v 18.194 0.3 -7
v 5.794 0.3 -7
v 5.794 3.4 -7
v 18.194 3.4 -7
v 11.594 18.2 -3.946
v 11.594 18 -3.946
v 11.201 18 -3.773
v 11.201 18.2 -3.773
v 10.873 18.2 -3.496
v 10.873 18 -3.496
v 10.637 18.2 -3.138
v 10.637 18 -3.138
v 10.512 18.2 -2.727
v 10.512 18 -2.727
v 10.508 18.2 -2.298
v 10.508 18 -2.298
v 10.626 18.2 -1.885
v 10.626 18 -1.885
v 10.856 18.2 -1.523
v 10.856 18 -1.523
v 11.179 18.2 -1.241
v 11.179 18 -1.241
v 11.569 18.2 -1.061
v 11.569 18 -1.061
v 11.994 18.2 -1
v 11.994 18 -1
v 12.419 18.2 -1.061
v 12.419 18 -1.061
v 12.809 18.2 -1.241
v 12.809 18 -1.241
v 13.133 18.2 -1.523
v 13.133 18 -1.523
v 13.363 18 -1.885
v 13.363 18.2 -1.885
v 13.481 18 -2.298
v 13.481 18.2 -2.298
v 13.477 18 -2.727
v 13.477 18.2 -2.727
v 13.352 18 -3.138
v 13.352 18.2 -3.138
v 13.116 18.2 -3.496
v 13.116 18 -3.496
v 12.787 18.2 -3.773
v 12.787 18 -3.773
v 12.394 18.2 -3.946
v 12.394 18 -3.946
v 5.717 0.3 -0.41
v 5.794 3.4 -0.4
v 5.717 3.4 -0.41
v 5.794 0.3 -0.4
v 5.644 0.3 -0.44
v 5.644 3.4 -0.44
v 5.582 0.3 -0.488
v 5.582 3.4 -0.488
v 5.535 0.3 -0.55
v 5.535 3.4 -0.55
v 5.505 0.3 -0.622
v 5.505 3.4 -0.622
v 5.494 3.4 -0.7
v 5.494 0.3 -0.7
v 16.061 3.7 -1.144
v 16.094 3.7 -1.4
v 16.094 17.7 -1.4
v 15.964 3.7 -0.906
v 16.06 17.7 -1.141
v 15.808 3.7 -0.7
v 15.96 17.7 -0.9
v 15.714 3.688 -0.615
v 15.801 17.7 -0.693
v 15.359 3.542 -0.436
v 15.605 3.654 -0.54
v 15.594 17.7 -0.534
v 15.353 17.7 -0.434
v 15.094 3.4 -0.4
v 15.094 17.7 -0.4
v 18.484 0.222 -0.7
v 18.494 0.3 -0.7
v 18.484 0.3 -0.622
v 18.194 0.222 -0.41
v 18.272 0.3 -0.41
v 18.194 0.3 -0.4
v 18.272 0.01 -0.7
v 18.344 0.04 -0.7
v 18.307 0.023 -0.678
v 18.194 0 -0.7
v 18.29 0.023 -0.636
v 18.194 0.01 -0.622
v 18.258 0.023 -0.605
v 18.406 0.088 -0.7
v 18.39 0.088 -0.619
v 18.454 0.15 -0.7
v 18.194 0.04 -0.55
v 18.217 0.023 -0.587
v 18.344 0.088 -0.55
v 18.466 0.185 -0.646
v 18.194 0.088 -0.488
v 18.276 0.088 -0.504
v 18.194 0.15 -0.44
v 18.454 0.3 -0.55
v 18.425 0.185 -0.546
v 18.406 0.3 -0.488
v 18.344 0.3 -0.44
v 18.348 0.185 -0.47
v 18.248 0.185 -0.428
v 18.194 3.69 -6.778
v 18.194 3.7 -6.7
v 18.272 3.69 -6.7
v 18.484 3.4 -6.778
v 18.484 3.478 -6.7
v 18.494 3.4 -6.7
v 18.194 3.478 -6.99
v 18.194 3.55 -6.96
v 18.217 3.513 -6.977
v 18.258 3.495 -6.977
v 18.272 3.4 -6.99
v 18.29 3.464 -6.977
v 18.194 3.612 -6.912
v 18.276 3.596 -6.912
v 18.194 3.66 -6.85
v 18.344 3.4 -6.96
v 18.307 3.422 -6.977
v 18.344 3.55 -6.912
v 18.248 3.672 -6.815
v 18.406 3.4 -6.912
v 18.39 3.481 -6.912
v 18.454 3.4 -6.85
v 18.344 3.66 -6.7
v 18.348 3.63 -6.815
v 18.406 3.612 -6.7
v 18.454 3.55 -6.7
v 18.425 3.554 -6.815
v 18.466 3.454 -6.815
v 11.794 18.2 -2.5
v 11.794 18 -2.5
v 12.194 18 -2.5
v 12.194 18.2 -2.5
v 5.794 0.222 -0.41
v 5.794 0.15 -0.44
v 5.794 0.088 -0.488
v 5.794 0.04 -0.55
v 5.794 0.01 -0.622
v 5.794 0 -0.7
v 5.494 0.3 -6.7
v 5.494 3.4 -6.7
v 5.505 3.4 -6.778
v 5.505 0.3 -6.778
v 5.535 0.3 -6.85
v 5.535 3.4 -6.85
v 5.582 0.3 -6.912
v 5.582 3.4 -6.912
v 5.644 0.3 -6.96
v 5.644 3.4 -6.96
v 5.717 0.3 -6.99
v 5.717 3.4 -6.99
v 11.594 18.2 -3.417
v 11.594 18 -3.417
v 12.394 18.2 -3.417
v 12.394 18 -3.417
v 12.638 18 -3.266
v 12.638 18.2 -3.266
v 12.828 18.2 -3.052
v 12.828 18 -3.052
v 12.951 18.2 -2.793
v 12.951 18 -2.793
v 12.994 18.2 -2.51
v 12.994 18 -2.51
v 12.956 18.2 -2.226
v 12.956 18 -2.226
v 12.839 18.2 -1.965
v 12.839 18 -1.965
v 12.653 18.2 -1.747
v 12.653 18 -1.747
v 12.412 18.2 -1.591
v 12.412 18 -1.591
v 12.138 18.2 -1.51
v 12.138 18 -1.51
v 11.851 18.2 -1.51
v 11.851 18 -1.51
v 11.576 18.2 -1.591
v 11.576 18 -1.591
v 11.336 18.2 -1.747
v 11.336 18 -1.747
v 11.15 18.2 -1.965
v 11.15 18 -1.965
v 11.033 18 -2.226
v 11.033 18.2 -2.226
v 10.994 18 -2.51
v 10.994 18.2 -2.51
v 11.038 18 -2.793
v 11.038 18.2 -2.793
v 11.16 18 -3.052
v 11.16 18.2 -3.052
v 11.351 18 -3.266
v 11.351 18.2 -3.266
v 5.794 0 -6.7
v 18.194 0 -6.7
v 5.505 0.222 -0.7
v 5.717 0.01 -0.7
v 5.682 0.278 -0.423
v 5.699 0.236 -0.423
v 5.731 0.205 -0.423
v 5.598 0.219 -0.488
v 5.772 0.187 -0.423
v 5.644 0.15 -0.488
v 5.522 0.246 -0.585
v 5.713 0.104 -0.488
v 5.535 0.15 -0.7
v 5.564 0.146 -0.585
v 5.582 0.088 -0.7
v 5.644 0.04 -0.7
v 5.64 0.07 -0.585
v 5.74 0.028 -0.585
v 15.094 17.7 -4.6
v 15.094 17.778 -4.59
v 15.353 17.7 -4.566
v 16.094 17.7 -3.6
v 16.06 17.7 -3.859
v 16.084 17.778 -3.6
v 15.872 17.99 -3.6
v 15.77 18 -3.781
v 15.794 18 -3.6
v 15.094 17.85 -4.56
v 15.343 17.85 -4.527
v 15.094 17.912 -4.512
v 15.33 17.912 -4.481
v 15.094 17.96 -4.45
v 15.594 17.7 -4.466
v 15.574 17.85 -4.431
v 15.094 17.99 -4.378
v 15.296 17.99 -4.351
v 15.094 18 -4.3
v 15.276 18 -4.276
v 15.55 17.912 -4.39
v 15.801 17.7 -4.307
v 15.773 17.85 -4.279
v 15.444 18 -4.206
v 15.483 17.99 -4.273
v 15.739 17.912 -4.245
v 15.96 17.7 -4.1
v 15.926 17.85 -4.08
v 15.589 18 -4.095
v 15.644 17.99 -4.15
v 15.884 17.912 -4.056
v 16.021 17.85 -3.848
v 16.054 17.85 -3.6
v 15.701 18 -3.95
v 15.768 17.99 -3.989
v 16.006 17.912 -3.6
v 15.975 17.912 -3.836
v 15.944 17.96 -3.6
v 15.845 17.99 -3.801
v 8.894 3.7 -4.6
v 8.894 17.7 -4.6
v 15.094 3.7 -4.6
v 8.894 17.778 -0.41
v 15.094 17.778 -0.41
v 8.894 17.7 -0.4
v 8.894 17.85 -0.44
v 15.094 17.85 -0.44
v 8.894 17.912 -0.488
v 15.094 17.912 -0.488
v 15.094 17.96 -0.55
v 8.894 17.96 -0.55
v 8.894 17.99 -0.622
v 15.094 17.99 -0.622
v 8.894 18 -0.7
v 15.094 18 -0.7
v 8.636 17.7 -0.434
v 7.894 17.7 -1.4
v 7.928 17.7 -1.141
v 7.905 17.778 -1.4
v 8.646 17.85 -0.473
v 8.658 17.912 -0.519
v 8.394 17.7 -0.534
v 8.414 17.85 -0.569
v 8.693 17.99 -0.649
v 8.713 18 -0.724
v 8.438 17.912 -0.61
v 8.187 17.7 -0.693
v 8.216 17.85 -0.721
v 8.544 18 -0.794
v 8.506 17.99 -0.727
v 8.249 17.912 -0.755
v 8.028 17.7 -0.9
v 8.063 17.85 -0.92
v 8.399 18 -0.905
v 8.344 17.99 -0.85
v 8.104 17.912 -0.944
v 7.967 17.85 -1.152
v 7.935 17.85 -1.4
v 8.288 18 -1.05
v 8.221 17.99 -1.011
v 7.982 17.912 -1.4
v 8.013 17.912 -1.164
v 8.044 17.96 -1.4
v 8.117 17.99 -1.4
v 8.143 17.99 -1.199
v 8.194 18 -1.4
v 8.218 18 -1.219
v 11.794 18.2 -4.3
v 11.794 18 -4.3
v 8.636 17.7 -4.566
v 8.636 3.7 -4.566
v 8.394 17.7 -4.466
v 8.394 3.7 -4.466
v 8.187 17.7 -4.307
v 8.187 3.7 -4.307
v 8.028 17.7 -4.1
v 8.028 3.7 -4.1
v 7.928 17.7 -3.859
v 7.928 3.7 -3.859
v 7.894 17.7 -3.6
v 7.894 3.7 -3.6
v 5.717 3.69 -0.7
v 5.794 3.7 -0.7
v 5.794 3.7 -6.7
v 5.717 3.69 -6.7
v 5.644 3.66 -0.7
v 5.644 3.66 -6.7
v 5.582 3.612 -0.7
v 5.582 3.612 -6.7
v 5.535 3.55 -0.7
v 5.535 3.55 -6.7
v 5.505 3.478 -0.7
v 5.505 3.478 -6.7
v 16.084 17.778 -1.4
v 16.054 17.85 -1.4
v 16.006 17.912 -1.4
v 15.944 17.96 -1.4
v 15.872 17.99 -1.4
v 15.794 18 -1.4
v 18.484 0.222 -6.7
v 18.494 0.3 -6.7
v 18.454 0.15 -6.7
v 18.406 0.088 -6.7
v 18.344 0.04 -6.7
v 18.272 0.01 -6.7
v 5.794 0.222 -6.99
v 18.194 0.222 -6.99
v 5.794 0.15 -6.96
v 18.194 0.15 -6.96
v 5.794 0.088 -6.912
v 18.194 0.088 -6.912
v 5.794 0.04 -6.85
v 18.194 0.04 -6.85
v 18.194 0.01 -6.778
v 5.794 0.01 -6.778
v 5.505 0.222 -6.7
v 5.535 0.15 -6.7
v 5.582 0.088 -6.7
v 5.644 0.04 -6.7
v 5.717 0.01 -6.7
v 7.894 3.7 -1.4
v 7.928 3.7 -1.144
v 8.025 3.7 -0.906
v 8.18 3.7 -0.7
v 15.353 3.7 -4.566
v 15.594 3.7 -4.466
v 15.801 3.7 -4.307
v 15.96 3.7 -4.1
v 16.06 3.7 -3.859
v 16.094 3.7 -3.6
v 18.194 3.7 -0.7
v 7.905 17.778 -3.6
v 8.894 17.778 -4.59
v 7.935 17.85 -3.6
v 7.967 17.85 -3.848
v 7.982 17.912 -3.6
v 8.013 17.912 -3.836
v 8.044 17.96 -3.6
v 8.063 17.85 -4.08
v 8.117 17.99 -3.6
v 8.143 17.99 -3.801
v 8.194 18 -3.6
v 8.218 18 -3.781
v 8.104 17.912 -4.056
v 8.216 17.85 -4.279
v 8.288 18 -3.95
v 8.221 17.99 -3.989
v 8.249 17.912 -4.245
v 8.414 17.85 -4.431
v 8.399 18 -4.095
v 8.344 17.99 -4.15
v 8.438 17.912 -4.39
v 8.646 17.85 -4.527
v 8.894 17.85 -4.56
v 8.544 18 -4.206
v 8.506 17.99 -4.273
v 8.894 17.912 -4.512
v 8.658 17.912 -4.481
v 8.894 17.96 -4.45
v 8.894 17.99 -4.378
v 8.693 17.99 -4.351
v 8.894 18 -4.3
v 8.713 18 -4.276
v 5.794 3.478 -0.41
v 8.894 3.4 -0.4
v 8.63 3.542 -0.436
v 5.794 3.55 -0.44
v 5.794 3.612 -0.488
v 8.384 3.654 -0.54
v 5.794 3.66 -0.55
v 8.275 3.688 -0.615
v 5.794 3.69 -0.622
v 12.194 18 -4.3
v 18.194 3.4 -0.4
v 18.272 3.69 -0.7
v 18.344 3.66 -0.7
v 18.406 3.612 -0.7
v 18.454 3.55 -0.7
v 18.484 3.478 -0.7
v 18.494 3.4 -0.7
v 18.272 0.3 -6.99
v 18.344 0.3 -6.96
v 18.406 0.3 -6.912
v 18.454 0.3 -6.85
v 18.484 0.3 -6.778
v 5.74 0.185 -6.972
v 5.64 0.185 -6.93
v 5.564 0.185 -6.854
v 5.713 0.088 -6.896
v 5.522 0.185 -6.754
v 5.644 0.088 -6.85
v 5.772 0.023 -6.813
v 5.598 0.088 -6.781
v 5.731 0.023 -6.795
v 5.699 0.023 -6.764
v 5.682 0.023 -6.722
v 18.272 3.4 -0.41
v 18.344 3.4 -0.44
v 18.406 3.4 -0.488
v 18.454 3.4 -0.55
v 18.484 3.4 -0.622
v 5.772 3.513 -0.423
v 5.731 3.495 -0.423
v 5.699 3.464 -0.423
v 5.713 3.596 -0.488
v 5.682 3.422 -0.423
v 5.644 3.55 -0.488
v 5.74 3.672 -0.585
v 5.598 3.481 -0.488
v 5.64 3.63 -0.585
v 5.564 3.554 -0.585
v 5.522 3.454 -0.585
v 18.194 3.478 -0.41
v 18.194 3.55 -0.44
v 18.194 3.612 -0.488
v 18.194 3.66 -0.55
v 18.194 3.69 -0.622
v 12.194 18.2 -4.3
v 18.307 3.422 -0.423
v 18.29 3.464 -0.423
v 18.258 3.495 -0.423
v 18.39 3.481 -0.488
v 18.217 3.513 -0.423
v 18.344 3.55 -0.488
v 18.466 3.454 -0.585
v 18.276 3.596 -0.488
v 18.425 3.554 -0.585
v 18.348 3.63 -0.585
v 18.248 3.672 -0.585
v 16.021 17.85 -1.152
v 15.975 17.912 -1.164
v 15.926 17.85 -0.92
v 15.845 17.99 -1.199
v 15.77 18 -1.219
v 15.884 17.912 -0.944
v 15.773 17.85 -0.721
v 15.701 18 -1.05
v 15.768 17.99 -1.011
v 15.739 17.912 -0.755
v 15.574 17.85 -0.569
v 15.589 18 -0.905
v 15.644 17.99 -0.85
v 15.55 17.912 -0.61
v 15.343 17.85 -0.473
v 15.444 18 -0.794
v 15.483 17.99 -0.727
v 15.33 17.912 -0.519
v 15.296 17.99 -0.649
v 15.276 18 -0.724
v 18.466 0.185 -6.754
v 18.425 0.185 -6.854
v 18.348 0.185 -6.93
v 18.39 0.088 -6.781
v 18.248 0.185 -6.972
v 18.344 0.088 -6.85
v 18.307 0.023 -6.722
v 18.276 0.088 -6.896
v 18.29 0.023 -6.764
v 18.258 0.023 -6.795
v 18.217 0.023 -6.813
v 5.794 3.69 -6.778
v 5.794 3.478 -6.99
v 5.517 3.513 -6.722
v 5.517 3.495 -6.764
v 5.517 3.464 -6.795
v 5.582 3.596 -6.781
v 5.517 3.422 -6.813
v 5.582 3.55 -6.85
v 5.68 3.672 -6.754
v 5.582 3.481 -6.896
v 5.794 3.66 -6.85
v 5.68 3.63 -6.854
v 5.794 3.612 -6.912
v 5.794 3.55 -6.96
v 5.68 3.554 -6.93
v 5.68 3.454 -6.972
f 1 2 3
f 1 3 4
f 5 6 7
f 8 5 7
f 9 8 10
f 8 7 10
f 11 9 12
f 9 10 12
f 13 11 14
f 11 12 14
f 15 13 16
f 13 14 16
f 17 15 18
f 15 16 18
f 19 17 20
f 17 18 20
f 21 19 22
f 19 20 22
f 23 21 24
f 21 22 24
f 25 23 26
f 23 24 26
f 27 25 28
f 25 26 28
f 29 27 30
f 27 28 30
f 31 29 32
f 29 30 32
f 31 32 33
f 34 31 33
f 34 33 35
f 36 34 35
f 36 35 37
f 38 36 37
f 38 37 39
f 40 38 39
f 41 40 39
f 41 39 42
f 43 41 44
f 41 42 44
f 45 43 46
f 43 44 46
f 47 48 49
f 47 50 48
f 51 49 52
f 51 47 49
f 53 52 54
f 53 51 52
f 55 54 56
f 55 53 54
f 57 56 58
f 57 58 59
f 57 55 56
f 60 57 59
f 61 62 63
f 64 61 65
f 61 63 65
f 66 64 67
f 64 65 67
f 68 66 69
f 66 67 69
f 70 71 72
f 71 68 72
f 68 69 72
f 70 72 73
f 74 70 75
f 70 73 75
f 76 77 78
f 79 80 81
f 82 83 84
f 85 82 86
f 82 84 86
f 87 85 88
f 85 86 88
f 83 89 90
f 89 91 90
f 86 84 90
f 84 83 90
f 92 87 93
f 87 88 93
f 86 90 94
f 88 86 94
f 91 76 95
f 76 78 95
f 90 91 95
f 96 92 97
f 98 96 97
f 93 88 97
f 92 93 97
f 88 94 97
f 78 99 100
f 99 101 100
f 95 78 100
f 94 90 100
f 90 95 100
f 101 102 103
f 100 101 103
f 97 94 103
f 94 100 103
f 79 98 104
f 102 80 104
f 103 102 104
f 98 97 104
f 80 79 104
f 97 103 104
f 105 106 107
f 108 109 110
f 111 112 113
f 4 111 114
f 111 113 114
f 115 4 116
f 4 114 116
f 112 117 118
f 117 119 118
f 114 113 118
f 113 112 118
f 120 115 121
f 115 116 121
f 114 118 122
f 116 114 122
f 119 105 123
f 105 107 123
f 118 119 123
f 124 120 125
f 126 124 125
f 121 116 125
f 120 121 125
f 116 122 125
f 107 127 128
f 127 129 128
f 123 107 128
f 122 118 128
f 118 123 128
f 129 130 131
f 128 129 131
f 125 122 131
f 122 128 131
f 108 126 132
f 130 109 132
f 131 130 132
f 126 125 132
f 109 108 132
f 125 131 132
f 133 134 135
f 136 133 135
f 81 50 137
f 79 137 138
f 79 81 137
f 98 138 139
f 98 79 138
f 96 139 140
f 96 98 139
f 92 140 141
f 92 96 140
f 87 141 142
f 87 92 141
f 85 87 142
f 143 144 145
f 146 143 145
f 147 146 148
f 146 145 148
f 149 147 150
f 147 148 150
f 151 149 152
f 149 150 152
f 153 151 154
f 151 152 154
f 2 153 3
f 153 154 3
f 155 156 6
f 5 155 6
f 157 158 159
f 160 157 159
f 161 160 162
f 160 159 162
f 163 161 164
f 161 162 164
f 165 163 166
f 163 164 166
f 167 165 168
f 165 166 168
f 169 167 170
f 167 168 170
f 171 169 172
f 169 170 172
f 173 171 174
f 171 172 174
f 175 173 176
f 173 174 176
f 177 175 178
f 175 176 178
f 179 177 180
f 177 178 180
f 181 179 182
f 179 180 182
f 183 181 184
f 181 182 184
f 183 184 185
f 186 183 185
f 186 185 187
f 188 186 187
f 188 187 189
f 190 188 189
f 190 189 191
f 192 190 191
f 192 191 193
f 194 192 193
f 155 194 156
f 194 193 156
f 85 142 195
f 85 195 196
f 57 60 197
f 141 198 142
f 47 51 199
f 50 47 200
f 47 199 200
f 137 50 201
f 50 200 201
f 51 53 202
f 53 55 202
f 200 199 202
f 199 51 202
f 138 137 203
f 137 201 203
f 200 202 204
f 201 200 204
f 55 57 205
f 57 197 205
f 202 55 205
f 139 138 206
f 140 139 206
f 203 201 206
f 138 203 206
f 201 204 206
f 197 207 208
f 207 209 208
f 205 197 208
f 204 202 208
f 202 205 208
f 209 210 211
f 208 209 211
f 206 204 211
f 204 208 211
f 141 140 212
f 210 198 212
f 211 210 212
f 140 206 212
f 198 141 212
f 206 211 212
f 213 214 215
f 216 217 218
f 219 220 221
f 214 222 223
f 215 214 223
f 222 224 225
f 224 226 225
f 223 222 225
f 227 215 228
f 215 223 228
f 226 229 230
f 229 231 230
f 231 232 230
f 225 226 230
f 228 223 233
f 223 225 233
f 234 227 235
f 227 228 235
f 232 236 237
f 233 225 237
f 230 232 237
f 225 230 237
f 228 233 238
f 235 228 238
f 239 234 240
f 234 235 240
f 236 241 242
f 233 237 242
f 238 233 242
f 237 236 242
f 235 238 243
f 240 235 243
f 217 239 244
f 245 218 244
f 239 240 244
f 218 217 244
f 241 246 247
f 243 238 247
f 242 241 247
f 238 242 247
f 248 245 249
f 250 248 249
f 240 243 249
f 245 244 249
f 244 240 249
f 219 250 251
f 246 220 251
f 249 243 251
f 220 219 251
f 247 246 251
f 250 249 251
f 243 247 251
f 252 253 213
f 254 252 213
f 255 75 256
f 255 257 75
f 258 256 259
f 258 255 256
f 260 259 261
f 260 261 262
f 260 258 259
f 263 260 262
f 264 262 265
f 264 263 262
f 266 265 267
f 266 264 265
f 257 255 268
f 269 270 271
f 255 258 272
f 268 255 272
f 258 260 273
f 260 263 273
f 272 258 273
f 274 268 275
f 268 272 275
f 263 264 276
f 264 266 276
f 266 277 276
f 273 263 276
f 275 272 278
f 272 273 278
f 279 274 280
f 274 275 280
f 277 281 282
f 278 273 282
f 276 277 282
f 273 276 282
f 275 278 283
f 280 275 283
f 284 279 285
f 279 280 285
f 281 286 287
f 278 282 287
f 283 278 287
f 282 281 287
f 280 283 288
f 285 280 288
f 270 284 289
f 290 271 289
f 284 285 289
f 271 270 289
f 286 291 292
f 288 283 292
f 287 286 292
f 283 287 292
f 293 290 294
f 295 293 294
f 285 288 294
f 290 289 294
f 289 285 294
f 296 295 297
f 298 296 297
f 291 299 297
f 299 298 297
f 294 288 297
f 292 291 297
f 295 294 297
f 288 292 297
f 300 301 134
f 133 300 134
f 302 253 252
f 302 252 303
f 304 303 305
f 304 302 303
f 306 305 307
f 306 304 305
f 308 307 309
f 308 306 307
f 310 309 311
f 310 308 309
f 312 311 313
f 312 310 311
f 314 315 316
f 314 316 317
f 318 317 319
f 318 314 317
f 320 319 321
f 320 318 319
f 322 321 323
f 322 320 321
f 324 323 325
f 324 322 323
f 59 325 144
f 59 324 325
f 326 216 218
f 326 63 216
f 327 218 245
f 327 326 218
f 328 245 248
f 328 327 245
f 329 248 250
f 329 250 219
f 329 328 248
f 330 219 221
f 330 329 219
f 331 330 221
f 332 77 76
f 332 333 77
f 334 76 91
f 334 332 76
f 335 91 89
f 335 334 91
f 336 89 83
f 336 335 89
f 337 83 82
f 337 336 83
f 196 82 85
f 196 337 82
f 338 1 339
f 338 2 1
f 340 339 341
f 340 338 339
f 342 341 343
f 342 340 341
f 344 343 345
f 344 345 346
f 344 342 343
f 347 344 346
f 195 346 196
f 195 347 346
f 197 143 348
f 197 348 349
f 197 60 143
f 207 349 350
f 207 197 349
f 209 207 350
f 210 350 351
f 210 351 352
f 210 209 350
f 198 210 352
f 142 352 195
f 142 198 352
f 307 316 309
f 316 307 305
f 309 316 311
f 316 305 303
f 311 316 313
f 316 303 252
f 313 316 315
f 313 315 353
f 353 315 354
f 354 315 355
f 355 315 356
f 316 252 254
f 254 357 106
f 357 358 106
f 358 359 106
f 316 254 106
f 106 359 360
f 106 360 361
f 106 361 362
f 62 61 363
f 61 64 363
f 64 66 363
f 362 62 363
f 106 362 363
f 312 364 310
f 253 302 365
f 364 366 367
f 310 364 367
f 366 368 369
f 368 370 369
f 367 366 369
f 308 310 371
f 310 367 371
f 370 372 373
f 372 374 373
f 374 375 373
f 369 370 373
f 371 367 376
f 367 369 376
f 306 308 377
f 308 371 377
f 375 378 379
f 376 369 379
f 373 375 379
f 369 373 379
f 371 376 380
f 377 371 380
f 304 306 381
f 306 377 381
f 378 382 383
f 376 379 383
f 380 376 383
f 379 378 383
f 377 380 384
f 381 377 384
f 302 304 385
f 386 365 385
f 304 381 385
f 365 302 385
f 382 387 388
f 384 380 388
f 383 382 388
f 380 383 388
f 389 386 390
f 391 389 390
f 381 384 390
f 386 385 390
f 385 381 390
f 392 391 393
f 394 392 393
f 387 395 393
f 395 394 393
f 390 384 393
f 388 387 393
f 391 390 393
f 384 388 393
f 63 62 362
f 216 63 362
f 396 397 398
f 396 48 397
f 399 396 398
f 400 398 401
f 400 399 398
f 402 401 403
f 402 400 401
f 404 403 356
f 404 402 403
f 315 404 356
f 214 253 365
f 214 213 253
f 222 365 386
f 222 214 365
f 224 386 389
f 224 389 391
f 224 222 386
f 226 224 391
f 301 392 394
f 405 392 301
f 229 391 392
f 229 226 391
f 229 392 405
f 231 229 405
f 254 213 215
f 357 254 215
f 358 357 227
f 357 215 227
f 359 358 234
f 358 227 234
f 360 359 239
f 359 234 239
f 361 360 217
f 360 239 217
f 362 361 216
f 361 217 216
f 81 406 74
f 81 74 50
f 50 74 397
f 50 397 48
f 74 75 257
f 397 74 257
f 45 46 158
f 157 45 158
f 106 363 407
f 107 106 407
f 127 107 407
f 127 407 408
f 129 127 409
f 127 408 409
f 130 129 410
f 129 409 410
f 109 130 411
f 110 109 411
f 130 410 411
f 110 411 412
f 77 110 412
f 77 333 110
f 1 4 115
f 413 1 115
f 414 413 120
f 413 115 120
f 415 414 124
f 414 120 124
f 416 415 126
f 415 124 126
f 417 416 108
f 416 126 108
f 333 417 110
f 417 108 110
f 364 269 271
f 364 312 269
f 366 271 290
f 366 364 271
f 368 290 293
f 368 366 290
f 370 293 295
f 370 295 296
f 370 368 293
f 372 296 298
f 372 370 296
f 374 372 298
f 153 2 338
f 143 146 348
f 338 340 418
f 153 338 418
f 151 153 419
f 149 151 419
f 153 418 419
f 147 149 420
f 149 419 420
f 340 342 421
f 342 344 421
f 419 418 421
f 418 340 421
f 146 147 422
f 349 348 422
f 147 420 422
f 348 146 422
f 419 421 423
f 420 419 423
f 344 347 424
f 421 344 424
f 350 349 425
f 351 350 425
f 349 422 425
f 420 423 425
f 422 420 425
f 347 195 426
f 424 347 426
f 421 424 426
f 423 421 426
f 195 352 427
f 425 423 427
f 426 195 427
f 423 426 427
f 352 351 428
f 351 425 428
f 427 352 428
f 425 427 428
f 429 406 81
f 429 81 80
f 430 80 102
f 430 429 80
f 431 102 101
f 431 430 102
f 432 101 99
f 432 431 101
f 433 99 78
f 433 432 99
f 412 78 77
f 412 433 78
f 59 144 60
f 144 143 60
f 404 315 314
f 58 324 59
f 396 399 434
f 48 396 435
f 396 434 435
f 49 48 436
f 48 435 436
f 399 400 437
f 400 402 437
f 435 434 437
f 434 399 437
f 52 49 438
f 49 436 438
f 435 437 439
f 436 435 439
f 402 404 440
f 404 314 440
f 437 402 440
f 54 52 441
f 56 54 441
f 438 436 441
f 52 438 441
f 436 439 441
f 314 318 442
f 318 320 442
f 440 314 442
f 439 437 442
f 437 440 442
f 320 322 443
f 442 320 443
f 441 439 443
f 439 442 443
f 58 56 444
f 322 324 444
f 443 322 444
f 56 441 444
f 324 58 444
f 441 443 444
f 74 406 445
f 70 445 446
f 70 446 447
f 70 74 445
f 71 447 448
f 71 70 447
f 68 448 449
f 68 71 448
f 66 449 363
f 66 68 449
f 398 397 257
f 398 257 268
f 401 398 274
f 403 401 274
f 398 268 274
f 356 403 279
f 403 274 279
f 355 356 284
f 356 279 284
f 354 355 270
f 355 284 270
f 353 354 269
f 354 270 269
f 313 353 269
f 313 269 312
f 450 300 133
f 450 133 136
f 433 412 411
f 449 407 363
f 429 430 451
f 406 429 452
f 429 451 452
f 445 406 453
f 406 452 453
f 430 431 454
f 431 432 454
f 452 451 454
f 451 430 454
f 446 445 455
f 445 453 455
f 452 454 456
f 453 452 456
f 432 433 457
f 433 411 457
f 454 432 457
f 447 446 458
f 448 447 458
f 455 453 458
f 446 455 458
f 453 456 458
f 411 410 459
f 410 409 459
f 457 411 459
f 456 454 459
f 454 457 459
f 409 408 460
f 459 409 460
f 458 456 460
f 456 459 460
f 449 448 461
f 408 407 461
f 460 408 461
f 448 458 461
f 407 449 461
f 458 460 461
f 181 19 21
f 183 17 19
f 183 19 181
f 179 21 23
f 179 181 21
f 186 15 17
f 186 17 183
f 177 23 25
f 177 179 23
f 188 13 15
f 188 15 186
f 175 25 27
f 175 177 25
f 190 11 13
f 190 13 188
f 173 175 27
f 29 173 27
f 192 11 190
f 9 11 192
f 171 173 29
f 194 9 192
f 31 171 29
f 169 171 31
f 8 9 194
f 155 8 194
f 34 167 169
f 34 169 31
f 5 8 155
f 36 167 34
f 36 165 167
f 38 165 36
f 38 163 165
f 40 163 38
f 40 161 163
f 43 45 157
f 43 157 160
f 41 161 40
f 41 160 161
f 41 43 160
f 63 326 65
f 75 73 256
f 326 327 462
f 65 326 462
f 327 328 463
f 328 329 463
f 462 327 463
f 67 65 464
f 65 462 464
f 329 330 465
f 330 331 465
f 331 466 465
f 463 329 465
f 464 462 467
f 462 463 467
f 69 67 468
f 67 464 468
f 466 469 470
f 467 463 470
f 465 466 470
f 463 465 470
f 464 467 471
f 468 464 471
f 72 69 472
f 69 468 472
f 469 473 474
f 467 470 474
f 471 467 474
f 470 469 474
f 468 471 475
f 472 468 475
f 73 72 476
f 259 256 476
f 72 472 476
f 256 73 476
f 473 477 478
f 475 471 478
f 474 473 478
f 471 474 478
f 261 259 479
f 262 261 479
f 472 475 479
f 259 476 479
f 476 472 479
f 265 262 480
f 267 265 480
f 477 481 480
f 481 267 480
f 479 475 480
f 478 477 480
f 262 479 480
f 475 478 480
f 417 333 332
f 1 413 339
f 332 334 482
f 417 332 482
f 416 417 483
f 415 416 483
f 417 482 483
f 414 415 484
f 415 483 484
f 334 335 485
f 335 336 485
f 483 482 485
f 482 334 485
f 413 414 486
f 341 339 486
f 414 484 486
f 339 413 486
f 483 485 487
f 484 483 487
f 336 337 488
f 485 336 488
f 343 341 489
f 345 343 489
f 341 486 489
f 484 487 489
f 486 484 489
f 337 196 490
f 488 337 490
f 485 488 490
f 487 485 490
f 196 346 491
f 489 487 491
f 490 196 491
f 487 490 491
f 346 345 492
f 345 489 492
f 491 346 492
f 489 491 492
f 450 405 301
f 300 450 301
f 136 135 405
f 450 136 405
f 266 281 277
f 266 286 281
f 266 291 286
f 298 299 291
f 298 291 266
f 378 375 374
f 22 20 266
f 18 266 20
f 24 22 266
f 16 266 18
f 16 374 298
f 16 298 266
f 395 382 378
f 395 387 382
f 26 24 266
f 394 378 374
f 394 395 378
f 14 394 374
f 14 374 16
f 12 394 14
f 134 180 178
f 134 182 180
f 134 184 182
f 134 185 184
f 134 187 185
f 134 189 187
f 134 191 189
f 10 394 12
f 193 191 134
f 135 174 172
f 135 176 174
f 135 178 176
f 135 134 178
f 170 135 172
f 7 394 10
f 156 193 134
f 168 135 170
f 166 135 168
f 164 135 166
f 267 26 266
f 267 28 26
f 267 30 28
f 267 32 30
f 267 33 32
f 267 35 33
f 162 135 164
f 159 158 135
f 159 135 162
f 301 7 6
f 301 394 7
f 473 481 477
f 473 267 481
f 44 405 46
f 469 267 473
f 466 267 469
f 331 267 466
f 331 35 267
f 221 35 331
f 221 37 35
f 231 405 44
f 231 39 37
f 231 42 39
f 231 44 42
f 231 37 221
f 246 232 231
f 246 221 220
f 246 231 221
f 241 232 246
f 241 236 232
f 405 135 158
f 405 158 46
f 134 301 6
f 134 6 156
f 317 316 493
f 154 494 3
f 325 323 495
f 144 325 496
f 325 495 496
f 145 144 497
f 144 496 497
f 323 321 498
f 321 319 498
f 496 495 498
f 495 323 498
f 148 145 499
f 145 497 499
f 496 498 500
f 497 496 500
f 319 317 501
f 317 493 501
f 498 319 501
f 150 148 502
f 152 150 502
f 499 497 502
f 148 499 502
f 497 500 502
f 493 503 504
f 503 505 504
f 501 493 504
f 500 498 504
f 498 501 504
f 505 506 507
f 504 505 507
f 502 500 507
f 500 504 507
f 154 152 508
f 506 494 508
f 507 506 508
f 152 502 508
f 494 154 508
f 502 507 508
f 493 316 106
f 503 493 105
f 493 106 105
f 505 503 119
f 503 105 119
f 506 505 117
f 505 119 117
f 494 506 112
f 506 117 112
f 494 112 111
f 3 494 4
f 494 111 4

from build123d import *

# Parameters (mm, degrees)
SKETCH_1_W          = 8.2
SKETCH_1_H          = 4.2
EXTRUDE_1_DEPTH     = 18
SKETCH_2_W          = 13
SKETCH_2_H          = 9
SKETCH_2_W_2        = 8.2
SKETCH_2_H_2        = 4.2
EXTRUDE_2_DEPTH     = 3.7
FILLET_1_R          = 1
FILLET_2_R          = 0.3
EXTRUDE_3_DEPTH     = 0.2
CUT_EXTRUDE_1_DEPTH = 10
FILLET_3_R          = 0.3


with BuildPart() as part:
    # 草图1 → 凸台-拉伸1 (new body)
    with BuildSketch(Plane(origin=(0, 0, 0), x_dir=(1, 0, 0), z_dir=(0, 1, 0))):
        with Locations((11.994336416, 2.5)):
            Rectangle(SKETCH_1_W, SKETCH_1_H)
    extrude(amount=EXTRUDE_1_DEPTH)

    # 草图2 → 凸台-拉伸2 (add)
    with BuildSketch(Plane.XZ):
        with Locations((11.994336416, -2.5)):
            Rectangle(SKETCH_2_W, SKETCH_2_H)
        with Locations((11.994336416, -2.5)):
            Rectangle(SKETCH_2_W_2, SKETCH_2_H_2, mode=Mode.SUBTRACT)
    extrude(amount=-EXTRUDE_2_DEPTH)

    # 圆角1
    fillet_1_edges = [part.edges().sort_by_distance(p)[0] for p in [
        (7.894336416, 10.85, -4.6),
        (16.094336416, 10.85, -4.6),
        (16.094336416, 10.85, -0.4),
        (7.894336416, 10.85, -0.4),
    ]]
    fillet(fillet_1_edges, radius=FILLET_1_R)

    # 圆角2
    fillet_2_edges = [part.edges().sort_by_distance(p)[0] for p in [
        (11.994336416, 3.7, 2),
        (5.494336416, 1.85, 2),
        (18.494336416, 3.7, -2.5),
        (18.494336416, 1.85, 2),
        (11.994336416, 3.7, -7),
        (18.494336416, 1.85, -7),
        (5.494336416, 3.7, -2.5),
        (5.494336416, 1.85, -7),
        (11.994336416, 18, -4.6),
        (16.094336416, 18, -2.5),
        (7.894336416, 18, -2.5),
        (11.994336416, 18, -0.4),
        (8.187229635, 18, -0.692893219),
        (8.187229635, 18, -4.307106781),
        (15.801443197, 18, -0.692893219),
        (15.801443197, 18, -4.307106781),
    ]]
    fillet(fillet_2_edges, radius=FILLET_2_R)

    # 草图3 → 凸台-拉伸3 (add)
    with BuildSketch(Plane(origin=(0, 18, 0), x_dir=(1, 0, 0), z_dir=(0, 1, 0))):
        Polygon((11.994336416, 2.5), (12.194336416, 2.5), (12.194336416, 4.3), (11.794336416, 4.3), (11.794336416, 2.5), align=None)
        with BuildLine():
            Line((11.594336416, 3.416515139), (11.594336416, 3.945683229))
            ThreePointArc((11.594336416, 3.945683229), (11.994336416, 1), (12.394336416, 3.945683229))
            Line((12.394336416, 3.945683229), (12.394336416, 3.416515139))
            ThreePointArc((12.394336416, 3.416515139), (11.994336416, 1.5), (11.594336416, 3.416515139))
        make_face()
    extrude(amount=EXTRUDE_3_DEPTH)

    # 草图4 → 切除-拉伸1 (cut)
    with BuildSketch(Plane(origin=(0, 3.7, 0), x_dir=(1, 0, 0), z_dir=(0, 1, 0))):
        Polygon((11.994336416, 0.4), (4.788962203, 0.4), (4.788962203, -2.393061312), (19.340992476, -2.393061312), (19.340992476, 0.4), align=None)
    extrude(amount=-CUT_EXTRUDE_1_DEPTH, mode=Mode.SUBTRACT)

    # 圆角3
    fillet_3_edges = [part.edges().sort_by_distance(p)[0] for p in [
        (18.40646845, 3.612132034, -0.4),
        (5.494336416, 0, -3.55),
        (5.582204382, 3.612132034, -0.4),
        (5.494336416, 1.7, -0.4),
        (18.494336416, 1.7, -0.4),
        (11.994336416, 0, -0.4),
        (16.644336416, 3.7, -0.4),
        (7.344336416, 3.7, -0.4),
        (18.494336416, 0, -3.55),
        (11.994336416, 0, -7),
        (5.582204382, 0, -6.912132034),
        (18.40646845, 0, -6.912132034),
    ]]
    fillet(fillet_3_edges, radius=FILLET_3_R)


solid = part.part
